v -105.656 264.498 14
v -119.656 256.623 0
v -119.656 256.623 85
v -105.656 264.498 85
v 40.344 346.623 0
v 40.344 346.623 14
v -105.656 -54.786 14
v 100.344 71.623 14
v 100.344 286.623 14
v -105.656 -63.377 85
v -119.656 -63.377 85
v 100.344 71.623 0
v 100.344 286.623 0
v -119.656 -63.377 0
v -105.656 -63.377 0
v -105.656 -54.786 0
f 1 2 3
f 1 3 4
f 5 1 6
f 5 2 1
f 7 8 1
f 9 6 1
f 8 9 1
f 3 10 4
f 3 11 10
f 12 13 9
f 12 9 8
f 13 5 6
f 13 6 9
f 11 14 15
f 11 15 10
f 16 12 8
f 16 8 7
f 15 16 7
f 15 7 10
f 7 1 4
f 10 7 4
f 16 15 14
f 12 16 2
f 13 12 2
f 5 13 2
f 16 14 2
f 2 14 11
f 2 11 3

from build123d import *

# Parameters (mm, degrees)
SKETCH_1_R             = 13
EXTRUDE_1_DEPTH        = 14
EXTRUDE_2_DEPTH        = 71
SKETCH_5_R             = 13
CUT_EXTRUDE_3_DEPTH    = 420.252591423
PATTERN_LINEAR_1_COUNT = 4
PATTERN_LINEAR_1_PITCH = 80
SKETCH_7_W             = 85
SKETCH_7_H             = 320
EXTRUDE_3_DEPTH        = 14
EXTRUDE_4_DEPTH        = 14


with BuildPart() as part:
    # 草图1 → 凸台-拉伸1 (new body)
    with BuildSketch(Plane.XY):
        Polygon((-119.656440364, -63.376666372), (-119.656440364, 256.623333628), (40.343559636, 346.623333628), (100.343559636, 286.623333628), (100.343559636, 71.623333628), align=None)
        with Locations((-16.318215015, 232.316337145)):
            Circle(SKETCH_1_R, mode=Mode.SUBTRACT)
        with Locations((36.830892091, 292.109082639)):
            Circle(SKETCH_1_R, mode=Mode.SUBTRACT)
    extrude(amount=EXTRUDE_1_DEPTH)

    # 草图3 → 凸台-拉伸2 (add)
    with BuildSketch(Plane.XY.offset(14)):
        Polygon((-105.656440364, 264.498333628), (-105.656440364, -54.785757281), (-119.656440364, -63.376666372), (-119.656440364, 256.623333628), align=None)
    extrude(amount=EXTRUDE_2_DEPTH)

    # 草图5 → 切除-拉伸3 (cut, through all)
    with BuildSketch(Plane.ZY.offset(119.656440364)):
        with Locations(Location((47, 216.623333628, 0), (0, 0, 270))):
            Circle(SKETCH_5_R)
    cut_extrude_3 = extrude(amount=-CUT_EXTRUDE_3_DEPTH, mode=Mode.SUBTRACT)

    # 阵列(线性)1: 切除-拉伸3 ×4
    with Locations(*[(0, -i * PATTERN_LINEAR_1_PITCH, 0) for i in range(1, PATTERN_LINEAR_1_COUNT)]):
        add(cut_extrude_3, mode=Mode.SUBTRACT)

    # 草图7 → 凸台-拉伸3 (add)
    with BuildSketch(Plane.ZY.offset(119.656440364)):
        with Locations((42.5, 96.623333628)):
            Rectangle(SKETCH_7_W, SKETCH_7_H)
    extrude(amount=-EXTRUDE_3_DEPTH)

    # 草图8 → 凸台-拉伸4 (add)
    with BuildSketch(Plane.XY.offset(14)):
        Polygon((-119.656440364, 256.623333628), (40.343559636, 346.623333628), (100.343559636, 286.623333628), (100.343559636, 71.623333628), (-119.656440364, -63.376666372), align=None)
    extrude(amount=-EXTRUDE_4_DEPTH)


solid = part.part
